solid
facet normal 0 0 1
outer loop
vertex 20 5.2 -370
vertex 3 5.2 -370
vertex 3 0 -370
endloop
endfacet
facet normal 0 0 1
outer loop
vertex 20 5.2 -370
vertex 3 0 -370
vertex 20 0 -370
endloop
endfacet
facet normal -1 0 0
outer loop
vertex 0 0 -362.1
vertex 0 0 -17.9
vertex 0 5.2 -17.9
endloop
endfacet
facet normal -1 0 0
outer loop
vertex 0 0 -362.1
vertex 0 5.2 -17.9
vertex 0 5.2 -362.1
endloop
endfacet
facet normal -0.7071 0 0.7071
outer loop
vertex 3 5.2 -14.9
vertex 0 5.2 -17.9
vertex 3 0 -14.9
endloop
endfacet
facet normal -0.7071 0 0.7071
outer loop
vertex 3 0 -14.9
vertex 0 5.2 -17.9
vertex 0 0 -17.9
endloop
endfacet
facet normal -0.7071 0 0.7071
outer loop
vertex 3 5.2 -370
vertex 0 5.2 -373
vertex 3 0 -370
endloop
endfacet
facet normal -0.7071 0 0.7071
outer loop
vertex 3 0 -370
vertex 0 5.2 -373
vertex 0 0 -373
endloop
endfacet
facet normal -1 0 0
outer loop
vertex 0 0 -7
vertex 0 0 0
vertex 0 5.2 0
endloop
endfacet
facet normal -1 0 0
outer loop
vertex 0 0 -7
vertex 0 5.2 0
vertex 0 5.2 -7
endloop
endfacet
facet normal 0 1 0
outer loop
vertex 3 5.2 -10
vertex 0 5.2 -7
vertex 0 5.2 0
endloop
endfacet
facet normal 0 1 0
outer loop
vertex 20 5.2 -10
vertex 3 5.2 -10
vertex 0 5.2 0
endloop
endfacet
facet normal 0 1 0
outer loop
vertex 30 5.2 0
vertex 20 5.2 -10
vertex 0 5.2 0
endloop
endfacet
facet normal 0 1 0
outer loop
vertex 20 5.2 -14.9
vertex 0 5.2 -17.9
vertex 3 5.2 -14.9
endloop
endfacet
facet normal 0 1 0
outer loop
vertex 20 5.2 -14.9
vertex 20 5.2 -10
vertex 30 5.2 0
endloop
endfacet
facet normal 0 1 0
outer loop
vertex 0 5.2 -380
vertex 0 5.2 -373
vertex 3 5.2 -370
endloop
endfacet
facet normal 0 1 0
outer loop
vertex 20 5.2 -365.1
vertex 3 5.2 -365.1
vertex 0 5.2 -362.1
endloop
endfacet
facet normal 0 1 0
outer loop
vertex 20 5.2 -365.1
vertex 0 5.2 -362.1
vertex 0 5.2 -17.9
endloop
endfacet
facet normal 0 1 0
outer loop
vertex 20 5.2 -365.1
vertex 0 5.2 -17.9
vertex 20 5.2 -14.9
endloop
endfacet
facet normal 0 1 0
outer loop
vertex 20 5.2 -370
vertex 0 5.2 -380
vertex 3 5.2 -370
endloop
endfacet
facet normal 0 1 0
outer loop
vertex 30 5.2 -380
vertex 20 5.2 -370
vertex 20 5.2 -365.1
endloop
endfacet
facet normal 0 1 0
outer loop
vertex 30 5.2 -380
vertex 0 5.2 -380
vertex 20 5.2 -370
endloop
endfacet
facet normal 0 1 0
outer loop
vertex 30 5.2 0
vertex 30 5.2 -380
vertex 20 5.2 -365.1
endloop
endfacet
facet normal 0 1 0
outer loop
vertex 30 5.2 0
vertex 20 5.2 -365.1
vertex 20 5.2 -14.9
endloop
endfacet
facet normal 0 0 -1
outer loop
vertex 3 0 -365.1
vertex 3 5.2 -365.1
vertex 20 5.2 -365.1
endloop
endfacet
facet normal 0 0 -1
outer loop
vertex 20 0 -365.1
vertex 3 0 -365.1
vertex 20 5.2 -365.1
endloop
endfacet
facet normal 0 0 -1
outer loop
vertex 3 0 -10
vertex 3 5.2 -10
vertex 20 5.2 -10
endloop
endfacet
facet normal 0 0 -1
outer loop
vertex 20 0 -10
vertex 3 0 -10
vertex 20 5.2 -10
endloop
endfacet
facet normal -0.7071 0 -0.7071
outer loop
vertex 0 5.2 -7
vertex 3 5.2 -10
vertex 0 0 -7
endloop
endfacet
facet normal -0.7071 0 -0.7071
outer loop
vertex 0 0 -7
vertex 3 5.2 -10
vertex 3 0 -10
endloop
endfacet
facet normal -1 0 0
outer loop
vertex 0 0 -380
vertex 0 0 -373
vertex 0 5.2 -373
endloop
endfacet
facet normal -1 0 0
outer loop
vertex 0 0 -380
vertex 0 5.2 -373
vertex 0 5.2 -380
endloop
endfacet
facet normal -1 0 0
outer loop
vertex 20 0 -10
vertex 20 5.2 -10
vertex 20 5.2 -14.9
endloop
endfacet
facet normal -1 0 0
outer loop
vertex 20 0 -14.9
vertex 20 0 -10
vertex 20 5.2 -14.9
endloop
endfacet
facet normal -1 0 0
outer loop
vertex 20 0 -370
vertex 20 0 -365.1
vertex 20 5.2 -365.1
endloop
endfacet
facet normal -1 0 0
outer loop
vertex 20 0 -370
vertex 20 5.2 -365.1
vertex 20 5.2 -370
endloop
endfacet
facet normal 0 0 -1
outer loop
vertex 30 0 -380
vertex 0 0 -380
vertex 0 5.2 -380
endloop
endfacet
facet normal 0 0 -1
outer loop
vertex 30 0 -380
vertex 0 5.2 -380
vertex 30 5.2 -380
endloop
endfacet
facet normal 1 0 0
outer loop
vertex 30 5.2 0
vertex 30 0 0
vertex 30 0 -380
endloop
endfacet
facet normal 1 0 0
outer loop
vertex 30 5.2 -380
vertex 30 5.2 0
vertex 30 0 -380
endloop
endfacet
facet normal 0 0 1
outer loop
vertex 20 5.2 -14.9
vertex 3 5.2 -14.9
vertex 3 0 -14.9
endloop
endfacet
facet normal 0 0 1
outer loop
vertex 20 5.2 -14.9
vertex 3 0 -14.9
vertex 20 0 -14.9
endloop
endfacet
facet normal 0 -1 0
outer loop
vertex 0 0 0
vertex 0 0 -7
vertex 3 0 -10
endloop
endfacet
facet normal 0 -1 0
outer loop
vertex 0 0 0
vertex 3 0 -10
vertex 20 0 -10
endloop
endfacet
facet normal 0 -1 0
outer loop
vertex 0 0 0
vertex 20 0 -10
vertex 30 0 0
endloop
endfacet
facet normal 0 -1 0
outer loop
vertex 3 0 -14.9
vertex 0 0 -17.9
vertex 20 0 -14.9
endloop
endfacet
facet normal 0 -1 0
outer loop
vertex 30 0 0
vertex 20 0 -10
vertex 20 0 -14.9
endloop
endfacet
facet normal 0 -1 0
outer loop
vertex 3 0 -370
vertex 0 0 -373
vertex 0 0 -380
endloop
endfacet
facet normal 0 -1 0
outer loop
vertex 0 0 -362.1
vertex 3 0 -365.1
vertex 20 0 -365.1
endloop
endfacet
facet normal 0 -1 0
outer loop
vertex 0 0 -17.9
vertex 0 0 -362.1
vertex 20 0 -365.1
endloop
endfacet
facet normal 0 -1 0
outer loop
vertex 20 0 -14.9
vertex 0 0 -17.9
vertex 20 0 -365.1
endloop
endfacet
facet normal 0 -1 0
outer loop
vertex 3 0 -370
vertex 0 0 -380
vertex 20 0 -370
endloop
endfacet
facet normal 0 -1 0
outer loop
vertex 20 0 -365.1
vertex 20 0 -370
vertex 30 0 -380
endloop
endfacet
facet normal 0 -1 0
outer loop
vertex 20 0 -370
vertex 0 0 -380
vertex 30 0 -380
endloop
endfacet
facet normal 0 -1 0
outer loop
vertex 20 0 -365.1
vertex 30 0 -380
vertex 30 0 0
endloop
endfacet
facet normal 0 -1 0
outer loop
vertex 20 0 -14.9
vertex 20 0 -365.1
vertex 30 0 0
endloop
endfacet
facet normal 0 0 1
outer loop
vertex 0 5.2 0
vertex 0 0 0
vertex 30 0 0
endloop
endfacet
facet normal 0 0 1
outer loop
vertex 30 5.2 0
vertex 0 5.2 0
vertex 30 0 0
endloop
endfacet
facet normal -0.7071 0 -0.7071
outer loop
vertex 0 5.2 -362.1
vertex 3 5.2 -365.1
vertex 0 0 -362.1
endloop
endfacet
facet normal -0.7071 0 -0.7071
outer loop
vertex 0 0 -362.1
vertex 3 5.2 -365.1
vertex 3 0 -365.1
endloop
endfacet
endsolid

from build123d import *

# Parameters (mm, degrees)
SKETCH1_W           = 30
SKETCH1_H           = 380
BOSS_EXTRUDE1_DEPTH = 5.2
SKETCH2_W           = 20
SKETCH2_H           = 4.9
CUT_EXTRUDE1_DEPTH  = 10
CHAMFER1_SIZE       = 3


with BuildPart() as part:
    # Sketch1 → Boss-Extrude1 (new body)
    with BuildSketch(Plane(origin=(0, 0, 0), x_dir=(1, 0, 0), z_dir=(0, 1, 0))):
        with Locations((15, 190)):
            Rectangle(SKETCH1_W, SKETCH1_H)
    extrude(amount=BOSS_EXTRUDE1_DEPTH)

    # Sketch2 → Cut-Extrude1 (cut)
    with BuildSketch(Plane(origin=(0, 5.2, 0), x_dir=(1, 0, 0), z_dir=(0, 1, 0))):
        with Locations((10, 367.55)):
            Rectangle(SKETCH2_W, SKETCH2_H)
        with Locations((10, 12.45)):
            Rectangle(SKETCH2_W, SKETCH2_H)
    extrude(amount=-CUT_EXTRUDE1_DEPTH, mode=Mode.SUBTRACT)

    # Chamfer1
    chamfer1_edges = [part.edges().sort_by_distance(p)[0] for p in [
        (0, 2.6, -365.1),
        (0, 2.6, -370),
        (0, 2.6, -10),
        (0, 2.6, -14.9),
    ]]
    chamfer(chamfer1_edges, length=CHAMFER1_SIZE)


solid = part.part
